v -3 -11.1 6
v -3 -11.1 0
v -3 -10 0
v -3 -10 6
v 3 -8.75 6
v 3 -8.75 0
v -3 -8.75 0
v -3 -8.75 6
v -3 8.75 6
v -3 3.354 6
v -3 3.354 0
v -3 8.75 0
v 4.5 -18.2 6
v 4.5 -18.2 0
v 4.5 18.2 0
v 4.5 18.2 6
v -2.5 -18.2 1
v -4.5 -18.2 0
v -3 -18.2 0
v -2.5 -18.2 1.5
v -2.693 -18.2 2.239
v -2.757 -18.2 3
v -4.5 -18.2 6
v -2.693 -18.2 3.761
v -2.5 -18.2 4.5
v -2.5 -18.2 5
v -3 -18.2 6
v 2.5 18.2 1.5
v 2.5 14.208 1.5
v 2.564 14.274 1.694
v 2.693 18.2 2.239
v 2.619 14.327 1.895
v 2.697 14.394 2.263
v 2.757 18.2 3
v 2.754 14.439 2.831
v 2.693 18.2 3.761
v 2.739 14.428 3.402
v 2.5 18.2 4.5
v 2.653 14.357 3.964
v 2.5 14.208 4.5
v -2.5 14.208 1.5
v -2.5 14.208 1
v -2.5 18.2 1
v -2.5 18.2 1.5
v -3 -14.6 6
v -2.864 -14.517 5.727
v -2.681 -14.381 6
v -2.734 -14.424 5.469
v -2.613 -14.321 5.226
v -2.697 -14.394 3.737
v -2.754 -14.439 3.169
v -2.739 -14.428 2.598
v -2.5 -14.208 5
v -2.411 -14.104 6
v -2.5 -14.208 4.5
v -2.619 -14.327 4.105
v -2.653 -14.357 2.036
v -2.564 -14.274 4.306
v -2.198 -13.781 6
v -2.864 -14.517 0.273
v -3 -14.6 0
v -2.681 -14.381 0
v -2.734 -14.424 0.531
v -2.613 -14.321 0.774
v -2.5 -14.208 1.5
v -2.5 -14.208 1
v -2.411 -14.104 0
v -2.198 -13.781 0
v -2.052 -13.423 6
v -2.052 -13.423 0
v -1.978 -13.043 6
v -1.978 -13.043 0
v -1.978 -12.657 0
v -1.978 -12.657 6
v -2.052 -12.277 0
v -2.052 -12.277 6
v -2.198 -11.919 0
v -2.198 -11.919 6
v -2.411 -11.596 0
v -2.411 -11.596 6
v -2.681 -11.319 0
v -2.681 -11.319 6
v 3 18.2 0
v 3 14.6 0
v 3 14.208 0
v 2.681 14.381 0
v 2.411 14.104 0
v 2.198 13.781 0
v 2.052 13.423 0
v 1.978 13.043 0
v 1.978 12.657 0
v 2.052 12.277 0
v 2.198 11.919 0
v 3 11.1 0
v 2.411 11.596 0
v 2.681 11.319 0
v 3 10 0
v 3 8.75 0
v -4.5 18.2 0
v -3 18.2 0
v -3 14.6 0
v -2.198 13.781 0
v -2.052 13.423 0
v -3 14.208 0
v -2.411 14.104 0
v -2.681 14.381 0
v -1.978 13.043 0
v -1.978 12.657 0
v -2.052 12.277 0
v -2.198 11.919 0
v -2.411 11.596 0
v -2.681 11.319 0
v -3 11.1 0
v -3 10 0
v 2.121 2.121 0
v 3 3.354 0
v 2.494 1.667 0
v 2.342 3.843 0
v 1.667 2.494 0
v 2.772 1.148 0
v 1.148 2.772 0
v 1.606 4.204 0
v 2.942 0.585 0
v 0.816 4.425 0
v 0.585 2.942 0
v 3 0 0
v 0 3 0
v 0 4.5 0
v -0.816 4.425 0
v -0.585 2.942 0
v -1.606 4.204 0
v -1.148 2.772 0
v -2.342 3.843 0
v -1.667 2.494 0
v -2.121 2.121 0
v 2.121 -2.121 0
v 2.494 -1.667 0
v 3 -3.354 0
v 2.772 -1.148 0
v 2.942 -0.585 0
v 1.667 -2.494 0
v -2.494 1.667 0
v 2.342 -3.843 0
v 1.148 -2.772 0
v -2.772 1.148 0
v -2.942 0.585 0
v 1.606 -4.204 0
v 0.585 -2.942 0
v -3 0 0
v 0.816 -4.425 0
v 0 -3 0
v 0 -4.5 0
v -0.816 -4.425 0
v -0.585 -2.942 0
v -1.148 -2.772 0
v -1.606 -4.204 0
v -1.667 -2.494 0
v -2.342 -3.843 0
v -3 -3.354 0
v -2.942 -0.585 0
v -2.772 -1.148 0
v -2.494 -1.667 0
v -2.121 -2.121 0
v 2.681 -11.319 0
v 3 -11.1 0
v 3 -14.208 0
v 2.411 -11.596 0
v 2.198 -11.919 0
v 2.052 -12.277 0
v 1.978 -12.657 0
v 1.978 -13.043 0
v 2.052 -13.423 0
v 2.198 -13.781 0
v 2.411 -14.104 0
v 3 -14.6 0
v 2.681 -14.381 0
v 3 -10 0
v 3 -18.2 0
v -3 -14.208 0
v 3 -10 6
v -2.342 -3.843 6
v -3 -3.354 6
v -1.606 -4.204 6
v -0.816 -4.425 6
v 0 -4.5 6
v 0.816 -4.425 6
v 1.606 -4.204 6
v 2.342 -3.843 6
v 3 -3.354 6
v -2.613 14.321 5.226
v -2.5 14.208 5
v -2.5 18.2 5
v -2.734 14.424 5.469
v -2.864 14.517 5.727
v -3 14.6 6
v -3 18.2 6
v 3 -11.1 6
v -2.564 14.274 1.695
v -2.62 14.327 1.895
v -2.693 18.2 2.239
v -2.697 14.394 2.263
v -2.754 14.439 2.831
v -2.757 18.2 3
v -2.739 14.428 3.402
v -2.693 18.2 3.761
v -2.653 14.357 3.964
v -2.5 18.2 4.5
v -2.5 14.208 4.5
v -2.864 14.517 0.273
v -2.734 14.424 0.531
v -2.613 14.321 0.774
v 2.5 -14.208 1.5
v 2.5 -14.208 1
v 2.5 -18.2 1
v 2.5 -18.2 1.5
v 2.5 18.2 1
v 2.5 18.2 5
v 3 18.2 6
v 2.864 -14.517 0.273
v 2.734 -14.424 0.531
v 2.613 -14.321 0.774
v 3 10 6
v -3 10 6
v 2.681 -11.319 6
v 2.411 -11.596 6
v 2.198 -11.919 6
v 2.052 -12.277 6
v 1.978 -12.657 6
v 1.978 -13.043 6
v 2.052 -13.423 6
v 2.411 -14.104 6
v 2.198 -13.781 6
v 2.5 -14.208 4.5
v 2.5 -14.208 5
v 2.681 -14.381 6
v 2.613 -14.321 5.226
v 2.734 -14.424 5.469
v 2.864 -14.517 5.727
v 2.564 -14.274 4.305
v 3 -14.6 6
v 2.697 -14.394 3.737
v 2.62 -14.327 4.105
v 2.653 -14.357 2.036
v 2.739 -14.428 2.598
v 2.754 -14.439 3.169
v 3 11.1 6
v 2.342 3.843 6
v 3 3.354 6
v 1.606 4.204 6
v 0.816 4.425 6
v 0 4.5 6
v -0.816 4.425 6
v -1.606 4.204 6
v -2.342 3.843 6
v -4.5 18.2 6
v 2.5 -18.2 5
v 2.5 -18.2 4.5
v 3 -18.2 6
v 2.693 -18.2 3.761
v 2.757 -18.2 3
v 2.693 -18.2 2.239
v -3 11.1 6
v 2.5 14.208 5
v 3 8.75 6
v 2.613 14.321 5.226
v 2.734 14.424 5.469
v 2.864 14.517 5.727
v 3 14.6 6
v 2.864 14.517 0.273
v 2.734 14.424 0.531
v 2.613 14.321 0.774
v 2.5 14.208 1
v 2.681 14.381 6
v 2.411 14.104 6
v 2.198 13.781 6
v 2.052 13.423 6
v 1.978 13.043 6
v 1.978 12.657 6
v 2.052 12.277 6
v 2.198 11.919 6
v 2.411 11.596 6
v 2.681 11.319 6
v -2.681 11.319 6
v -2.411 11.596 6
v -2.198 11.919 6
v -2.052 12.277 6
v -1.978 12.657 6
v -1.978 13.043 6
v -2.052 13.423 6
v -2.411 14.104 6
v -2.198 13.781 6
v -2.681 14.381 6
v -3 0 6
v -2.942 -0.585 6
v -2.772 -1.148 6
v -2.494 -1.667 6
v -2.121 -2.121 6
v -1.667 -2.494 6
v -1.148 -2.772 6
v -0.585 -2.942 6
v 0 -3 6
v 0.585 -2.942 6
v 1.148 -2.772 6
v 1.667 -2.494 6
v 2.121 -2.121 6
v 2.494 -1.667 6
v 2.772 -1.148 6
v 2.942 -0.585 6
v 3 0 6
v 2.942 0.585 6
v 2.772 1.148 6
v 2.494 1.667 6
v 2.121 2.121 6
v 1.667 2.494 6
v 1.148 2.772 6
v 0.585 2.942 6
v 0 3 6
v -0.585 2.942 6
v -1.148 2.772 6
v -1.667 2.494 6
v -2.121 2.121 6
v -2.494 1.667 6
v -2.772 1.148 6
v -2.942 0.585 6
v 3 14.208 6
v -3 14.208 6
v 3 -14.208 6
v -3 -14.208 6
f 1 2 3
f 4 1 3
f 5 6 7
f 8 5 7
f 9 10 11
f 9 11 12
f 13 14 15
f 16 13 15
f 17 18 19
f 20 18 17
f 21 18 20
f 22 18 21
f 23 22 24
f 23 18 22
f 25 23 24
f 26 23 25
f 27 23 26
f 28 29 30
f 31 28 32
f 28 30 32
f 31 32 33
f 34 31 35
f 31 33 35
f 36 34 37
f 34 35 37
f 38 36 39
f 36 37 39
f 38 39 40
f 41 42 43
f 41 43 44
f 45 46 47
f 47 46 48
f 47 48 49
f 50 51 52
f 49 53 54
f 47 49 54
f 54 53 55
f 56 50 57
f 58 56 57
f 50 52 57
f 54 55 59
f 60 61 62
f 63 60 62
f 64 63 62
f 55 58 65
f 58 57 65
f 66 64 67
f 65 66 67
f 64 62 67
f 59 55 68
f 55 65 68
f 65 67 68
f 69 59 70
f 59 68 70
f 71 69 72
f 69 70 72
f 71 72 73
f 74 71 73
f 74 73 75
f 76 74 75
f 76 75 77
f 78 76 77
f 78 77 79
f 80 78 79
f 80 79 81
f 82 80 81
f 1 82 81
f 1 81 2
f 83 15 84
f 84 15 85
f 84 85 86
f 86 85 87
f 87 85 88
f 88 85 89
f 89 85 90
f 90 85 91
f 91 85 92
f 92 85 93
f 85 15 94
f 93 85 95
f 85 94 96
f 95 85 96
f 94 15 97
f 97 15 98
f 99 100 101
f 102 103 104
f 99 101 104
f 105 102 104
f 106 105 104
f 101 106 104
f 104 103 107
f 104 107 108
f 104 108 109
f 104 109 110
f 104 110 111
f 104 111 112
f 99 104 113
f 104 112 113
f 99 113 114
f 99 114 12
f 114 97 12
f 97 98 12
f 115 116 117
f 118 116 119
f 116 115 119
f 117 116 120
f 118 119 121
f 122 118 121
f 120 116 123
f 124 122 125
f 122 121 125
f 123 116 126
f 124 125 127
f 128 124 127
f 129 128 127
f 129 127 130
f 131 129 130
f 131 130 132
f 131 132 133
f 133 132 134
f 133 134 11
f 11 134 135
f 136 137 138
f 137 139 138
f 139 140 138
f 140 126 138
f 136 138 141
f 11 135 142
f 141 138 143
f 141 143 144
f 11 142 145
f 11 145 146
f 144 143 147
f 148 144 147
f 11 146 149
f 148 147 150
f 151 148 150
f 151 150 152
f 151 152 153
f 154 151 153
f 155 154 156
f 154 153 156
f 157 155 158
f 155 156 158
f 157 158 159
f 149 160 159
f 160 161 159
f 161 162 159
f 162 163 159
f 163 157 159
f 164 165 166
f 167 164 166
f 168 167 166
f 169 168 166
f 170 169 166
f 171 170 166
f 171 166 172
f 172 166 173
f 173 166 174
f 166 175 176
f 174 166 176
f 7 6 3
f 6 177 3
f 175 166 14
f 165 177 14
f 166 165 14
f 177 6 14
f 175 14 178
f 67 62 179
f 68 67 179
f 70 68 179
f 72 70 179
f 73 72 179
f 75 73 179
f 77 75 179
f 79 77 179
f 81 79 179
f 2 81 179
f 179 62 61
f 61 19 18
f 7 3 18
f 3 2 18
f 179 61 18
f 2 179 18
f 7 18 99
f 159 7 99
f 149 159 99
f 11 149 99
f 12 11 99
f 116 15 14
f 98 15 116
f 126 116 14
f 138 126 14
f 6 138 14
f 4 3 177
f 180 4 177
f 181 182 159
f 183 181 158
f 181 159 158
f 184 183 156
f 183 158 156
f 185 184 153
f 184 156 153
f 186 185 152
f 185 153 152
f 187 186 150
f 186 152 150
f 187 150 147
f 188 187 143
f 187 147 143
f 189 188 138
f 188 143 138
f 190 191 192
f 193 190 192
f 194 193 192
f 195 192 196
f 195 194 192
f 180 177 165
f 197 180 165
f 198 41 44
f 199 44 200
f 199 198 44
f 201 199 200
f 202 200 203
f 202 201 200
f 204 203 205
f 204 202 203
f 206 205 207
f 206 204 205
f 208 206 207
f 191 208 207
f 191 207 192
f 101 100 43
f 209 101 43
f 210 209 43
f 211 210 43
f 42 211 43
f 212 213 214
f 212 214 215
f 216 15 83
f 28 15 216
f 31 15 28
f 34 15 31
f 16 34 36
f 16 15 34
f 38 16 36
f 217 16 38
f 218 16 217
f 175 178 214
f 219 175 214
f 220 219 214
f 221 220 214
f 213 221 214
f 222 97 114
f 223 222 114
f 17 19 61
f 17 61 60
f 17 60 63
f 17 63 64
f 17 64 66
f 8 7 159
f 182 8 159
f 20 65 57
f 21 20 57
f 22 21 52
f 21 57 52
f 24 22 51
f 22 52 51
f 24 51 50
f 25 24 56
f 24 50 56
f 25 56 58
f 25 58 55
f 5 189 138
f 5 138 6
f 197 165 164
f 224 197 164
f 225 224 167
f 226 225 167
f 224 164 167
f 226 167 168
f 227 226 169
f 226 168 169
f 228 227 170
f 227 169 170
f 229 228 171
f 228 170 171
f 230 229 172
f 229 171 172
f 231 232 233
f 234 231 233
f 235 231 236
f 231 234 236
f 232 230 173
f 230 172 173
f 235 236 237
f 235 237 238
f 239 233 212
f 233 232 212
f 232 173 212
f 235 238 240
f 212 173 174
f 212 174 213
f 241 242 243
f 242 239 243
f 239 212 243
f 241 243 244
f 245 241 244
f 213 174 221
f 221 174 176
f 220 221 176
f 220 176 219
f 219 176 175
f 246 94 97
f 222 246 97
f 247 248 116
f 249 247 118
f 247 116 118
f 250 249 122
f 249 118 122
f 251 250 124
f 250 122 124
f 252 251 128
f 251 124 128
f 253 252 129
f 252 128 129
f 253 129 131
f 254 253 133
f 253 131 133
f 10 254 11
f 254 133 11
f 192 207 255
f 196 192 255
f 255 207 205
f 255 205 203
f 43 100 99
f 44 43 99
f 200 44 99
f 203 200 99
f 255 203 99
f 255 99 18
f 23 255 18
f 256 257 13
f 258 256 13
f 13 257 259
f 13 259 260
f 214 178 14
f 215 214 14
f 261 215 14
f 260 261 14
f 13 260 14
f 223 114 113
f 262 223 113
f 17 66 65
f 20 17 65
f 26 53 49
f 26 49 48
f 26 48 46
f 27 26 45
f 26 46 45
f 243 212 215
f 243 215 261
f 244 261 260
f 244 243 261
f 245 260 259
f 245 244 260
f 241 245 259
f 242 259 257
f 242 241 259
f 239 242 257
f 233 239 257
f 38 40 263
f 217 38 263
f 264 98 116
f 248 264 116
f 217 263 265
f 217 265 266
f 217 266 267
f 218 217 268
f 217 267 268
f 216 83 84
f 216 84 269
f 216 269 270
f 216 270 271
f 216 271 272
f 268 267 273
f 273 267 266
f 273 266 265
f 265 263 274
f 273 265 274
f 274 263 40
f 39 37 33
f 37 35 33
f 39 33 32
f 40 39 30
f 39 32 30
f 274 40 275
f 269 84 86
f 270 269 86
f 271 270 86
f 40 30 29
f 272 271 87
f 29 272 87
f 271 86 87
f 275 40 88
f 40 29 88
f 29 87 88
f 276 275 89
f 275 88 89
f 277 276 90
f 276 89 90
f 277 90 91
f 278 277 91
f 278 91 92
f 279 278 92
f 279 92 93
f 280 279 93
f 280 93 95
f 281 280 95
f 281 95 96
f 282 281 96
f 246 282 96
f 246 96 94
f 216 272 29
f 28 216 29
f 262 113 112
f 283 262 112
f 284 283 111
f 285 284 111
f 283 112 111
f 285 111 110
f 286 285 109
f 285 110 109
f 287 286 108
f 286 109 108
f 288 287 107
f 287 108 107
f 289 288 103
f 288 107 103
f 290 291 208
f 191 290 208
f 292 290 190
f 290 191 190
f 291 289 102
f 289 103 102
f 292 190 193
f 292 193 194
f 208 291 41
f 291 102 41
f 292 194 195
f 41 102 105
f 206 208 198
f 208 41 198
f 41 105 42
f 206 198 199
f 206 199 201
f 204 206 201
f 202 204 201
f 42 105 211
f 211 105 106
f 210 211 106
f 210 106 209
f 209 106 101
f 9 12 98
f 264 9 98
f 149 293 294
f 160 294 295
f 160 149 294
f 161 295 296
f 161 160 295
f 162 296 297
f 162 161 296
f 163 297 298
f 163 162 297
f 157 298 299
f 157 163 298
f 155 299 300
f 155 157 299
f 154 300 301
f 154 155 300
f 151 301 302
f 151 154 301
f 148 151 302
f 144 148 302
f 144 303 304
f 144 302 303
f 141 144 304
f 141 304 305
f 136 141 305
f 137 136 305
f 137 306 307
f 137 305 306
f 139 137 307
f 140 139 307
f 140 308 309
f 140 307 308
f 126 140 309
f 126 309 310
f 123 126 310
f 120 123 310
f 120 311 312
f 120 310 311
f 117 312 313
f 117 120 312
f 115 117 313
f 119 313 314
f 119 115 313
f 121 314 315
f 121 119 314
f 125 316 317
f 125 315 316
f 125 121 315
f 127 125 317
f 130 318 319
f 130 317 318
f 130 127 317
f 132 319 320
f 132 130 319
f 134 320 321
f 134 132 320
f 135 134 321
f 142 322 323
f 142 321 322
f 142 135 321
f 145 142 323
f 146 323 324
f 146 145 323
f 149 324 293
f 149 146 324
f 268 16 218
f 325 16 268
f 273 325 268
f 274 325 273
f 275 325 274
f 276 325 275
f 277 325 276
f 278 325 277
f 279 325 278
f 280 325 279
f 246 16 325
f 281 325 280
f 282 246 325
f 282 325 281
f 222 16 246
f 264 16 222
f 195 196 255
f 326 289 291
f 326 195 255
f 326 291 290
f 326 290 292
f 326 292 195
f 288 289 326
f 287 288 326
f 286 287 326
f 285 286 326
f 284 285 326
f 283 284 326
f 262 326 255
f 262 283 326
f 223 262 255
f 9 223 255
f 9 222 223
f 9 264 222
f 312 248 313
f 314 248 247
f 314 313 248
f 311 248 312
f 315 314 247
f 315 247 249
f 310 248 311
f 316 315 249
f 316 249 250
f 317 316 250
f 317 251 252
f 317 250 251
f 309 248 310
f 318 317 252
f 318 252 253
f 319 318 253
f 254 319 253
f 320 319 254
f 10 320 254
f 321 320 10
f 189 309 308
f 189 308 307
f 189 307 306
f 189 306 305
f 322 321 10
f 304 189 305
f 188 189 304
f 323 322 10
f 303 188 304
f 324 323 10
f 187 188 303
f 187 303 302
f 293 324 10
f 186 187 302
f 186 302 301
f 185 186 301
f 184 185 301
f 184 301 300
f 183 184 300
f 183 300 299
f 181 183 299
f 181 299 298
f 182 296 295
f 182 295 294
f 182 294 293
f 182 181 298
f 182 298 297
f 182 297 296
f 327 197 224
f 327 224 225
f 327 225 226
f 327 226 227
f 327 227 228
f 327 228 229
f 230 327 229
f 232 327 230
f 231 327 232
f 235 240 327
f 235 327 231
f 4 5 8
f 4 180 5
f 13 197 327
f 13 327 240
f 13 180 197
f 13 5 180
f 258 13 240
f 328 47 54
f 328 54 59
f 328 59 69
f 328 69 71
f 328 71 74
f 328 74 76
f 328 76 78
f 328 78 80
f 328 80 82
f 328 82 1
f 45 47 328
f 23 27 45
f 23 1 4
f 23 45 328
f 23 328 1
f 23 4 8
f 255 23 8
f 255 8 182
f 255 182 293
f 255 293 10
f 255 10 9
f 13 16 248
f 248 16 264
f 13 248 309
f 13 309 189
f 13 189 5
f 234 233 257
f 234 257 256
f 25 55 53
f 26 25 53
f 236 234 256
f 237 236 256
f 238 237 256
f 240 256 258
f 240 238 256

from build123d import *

# Parameters (mm, degrees)
EXTRUDE_1_DEPTH          = 6
SKETCH_2_R               = 3
CUT_EXTRUDE_1_DEPTH      = 20.684765683
EXTRUDE_2_REACH          = 25.907
PATTERN_CIRCULAR_1_COUNT = 2


with BuildPart() as part:
    # 草图1 → 凸台-拉伸1 (new body)
    with BuildSketch(Plane.XY):
        with BuildLine():
            Line((-4.5, 0), (-4.5, -18.2))
            Line((-4.5, -18.2), (-3, -18.2))
            Line((-3, -18.2), (-3, -14.6))
            ThreePointArc((-3, -14.6), (-1.968245837, -12.85), (-3, -11.1))
            Line((-3, -11.1), (-3, -10))
            Line((-3, -10), (3, -10))
            Line((3, -10), (3, -11.1))
            ThreePointArc((3, -11.1), (1.968245837, -12.85), (3, -14.6))
            Line((3, -14.6), (3, -18.2))
            Line((3, -18.2), (4.5, -18.2))
            Line((4.5, -18.2), (4.5, 0))
            ThreePointArc((4.5, 0), (0, 4.5), (-4.5, 0))
        make_face()
    extrude_1 = extrude(amount=EXTRUDE_1_DEPTH)

    # 草图2 → 切除-拉伸1 (cut, through all)
    with BuildSketch(Plane.XY):
        Circle(SKETCH_2_R)
        with BuildLine():
            Line((-3, -8.75), (-3, -3.354101966))
            ThreePointArc((-3, -3.354101966), (0, -4.5), (3, -3.354101966))
            Line((3, -3.354101966), (3, -8.75))
            Line((3, -8.75), (-3, -8.75))
        make_face()
    cut_extrude_1 = extrude(amount=CUT_EXTRUDE_1_DEPTH, mode=Mode.SUBTRACT)

    # 草图3 → 凸台-拉伸2 (add, up to next)
    with BuildSketch(Plane.XZ.offset(18.2), mode=Mode.PRIVATE) as extrude_2_sk1:
        with BuildLine():
            Line((-3, 6), (-3, 0))
            Line((-3, 0), (-2.5, 1))
            Line((-2.5, 1), (-2.5, 1.5))
            ThreePointArc((-2.5, 1.5), (-2.757359313, 3), (-2.5, 4.5))
            Line((-2.5, 4.5), (-2.5, 5))
            Line((-2.5, 5), (-3, 6))
        make_face()
    extrude_2_tool1 = extrude(extrude_2_sk1.sketch, amount=-EXTRUDE_2_REACH, mode=Mode.PRIVATE) - part.part
    # 草图3 → 凸台-拉伸2 (add, up to next)
    with BuildSketch(Plane.XZ.offset(18.2), mode=Mode.PRIVATE) as extrude_2_sk2:
        with BuildLine():
            Line((3, 0), (2.5, 1))
            Line((2.5, 1), (2.5, 1.5))
            ThreePointArc((2.5, 1.5), (2.757359313, 3), (2.5, 4.5))
            Line((2.5, 4.5), (2.5, 5))
            Line((2.5, 5), (3, 6))
            Line((3, 6), (3, 0))
        make_face()
    extrude_2_tool2 = extrude(extrude_2_sk2.sketch, amount=-EXTRUDE_2_REACH, mode=Mode.PRIVATE) - part.part
    extrude_2_1 = extrude_2_tool1.solids().sort_by_distance((-2.809362, -18.2, 3))[0]
    add(extrude_2_1)
    extrude_2_2 = extrude_2_tool2.solids().sort_by_distance((2.809362, -18.2, 3))[0]
    add(extrude_2_2)
    extrude_2 = extrude_2_1 + extrude_2_2  # 凸台-拉伸2 as one shape, for the pattern or mirror that repeats it

    # 阵列(圆周)1: 凸台-拉伸1, 切除-拉伸1, 凸台-拉伸2 ×2 about axis
    pattern_circular_1_axis = Axis((0, 0, 0), (0, 0, 1))
    add([extrude_1.rotate(pattern_circular_1_axis, i * 360 / PATTERN_CIRCULAR_1_COUNT) for i in range(1, PATTERN_CIRCULAR_1_COUNT)])
    add([cut_extrude_1.rotate(pattern_circular_1_axis, i * 360 / PATTERN_CIRCULAR_1_COUNT) for i in range(1, PATTERN_CIRCULAR_1_COUNT)], mode=Mode.SUBTRACT)
    add([extrude_2.rotate(pattern_circular_1_axis, i * 360 / PATTERN_CIRCULAR_1_COUNT) for i in range(1, PATTERN_CIRCULAR_1_COUNT)])


solid = part.part
